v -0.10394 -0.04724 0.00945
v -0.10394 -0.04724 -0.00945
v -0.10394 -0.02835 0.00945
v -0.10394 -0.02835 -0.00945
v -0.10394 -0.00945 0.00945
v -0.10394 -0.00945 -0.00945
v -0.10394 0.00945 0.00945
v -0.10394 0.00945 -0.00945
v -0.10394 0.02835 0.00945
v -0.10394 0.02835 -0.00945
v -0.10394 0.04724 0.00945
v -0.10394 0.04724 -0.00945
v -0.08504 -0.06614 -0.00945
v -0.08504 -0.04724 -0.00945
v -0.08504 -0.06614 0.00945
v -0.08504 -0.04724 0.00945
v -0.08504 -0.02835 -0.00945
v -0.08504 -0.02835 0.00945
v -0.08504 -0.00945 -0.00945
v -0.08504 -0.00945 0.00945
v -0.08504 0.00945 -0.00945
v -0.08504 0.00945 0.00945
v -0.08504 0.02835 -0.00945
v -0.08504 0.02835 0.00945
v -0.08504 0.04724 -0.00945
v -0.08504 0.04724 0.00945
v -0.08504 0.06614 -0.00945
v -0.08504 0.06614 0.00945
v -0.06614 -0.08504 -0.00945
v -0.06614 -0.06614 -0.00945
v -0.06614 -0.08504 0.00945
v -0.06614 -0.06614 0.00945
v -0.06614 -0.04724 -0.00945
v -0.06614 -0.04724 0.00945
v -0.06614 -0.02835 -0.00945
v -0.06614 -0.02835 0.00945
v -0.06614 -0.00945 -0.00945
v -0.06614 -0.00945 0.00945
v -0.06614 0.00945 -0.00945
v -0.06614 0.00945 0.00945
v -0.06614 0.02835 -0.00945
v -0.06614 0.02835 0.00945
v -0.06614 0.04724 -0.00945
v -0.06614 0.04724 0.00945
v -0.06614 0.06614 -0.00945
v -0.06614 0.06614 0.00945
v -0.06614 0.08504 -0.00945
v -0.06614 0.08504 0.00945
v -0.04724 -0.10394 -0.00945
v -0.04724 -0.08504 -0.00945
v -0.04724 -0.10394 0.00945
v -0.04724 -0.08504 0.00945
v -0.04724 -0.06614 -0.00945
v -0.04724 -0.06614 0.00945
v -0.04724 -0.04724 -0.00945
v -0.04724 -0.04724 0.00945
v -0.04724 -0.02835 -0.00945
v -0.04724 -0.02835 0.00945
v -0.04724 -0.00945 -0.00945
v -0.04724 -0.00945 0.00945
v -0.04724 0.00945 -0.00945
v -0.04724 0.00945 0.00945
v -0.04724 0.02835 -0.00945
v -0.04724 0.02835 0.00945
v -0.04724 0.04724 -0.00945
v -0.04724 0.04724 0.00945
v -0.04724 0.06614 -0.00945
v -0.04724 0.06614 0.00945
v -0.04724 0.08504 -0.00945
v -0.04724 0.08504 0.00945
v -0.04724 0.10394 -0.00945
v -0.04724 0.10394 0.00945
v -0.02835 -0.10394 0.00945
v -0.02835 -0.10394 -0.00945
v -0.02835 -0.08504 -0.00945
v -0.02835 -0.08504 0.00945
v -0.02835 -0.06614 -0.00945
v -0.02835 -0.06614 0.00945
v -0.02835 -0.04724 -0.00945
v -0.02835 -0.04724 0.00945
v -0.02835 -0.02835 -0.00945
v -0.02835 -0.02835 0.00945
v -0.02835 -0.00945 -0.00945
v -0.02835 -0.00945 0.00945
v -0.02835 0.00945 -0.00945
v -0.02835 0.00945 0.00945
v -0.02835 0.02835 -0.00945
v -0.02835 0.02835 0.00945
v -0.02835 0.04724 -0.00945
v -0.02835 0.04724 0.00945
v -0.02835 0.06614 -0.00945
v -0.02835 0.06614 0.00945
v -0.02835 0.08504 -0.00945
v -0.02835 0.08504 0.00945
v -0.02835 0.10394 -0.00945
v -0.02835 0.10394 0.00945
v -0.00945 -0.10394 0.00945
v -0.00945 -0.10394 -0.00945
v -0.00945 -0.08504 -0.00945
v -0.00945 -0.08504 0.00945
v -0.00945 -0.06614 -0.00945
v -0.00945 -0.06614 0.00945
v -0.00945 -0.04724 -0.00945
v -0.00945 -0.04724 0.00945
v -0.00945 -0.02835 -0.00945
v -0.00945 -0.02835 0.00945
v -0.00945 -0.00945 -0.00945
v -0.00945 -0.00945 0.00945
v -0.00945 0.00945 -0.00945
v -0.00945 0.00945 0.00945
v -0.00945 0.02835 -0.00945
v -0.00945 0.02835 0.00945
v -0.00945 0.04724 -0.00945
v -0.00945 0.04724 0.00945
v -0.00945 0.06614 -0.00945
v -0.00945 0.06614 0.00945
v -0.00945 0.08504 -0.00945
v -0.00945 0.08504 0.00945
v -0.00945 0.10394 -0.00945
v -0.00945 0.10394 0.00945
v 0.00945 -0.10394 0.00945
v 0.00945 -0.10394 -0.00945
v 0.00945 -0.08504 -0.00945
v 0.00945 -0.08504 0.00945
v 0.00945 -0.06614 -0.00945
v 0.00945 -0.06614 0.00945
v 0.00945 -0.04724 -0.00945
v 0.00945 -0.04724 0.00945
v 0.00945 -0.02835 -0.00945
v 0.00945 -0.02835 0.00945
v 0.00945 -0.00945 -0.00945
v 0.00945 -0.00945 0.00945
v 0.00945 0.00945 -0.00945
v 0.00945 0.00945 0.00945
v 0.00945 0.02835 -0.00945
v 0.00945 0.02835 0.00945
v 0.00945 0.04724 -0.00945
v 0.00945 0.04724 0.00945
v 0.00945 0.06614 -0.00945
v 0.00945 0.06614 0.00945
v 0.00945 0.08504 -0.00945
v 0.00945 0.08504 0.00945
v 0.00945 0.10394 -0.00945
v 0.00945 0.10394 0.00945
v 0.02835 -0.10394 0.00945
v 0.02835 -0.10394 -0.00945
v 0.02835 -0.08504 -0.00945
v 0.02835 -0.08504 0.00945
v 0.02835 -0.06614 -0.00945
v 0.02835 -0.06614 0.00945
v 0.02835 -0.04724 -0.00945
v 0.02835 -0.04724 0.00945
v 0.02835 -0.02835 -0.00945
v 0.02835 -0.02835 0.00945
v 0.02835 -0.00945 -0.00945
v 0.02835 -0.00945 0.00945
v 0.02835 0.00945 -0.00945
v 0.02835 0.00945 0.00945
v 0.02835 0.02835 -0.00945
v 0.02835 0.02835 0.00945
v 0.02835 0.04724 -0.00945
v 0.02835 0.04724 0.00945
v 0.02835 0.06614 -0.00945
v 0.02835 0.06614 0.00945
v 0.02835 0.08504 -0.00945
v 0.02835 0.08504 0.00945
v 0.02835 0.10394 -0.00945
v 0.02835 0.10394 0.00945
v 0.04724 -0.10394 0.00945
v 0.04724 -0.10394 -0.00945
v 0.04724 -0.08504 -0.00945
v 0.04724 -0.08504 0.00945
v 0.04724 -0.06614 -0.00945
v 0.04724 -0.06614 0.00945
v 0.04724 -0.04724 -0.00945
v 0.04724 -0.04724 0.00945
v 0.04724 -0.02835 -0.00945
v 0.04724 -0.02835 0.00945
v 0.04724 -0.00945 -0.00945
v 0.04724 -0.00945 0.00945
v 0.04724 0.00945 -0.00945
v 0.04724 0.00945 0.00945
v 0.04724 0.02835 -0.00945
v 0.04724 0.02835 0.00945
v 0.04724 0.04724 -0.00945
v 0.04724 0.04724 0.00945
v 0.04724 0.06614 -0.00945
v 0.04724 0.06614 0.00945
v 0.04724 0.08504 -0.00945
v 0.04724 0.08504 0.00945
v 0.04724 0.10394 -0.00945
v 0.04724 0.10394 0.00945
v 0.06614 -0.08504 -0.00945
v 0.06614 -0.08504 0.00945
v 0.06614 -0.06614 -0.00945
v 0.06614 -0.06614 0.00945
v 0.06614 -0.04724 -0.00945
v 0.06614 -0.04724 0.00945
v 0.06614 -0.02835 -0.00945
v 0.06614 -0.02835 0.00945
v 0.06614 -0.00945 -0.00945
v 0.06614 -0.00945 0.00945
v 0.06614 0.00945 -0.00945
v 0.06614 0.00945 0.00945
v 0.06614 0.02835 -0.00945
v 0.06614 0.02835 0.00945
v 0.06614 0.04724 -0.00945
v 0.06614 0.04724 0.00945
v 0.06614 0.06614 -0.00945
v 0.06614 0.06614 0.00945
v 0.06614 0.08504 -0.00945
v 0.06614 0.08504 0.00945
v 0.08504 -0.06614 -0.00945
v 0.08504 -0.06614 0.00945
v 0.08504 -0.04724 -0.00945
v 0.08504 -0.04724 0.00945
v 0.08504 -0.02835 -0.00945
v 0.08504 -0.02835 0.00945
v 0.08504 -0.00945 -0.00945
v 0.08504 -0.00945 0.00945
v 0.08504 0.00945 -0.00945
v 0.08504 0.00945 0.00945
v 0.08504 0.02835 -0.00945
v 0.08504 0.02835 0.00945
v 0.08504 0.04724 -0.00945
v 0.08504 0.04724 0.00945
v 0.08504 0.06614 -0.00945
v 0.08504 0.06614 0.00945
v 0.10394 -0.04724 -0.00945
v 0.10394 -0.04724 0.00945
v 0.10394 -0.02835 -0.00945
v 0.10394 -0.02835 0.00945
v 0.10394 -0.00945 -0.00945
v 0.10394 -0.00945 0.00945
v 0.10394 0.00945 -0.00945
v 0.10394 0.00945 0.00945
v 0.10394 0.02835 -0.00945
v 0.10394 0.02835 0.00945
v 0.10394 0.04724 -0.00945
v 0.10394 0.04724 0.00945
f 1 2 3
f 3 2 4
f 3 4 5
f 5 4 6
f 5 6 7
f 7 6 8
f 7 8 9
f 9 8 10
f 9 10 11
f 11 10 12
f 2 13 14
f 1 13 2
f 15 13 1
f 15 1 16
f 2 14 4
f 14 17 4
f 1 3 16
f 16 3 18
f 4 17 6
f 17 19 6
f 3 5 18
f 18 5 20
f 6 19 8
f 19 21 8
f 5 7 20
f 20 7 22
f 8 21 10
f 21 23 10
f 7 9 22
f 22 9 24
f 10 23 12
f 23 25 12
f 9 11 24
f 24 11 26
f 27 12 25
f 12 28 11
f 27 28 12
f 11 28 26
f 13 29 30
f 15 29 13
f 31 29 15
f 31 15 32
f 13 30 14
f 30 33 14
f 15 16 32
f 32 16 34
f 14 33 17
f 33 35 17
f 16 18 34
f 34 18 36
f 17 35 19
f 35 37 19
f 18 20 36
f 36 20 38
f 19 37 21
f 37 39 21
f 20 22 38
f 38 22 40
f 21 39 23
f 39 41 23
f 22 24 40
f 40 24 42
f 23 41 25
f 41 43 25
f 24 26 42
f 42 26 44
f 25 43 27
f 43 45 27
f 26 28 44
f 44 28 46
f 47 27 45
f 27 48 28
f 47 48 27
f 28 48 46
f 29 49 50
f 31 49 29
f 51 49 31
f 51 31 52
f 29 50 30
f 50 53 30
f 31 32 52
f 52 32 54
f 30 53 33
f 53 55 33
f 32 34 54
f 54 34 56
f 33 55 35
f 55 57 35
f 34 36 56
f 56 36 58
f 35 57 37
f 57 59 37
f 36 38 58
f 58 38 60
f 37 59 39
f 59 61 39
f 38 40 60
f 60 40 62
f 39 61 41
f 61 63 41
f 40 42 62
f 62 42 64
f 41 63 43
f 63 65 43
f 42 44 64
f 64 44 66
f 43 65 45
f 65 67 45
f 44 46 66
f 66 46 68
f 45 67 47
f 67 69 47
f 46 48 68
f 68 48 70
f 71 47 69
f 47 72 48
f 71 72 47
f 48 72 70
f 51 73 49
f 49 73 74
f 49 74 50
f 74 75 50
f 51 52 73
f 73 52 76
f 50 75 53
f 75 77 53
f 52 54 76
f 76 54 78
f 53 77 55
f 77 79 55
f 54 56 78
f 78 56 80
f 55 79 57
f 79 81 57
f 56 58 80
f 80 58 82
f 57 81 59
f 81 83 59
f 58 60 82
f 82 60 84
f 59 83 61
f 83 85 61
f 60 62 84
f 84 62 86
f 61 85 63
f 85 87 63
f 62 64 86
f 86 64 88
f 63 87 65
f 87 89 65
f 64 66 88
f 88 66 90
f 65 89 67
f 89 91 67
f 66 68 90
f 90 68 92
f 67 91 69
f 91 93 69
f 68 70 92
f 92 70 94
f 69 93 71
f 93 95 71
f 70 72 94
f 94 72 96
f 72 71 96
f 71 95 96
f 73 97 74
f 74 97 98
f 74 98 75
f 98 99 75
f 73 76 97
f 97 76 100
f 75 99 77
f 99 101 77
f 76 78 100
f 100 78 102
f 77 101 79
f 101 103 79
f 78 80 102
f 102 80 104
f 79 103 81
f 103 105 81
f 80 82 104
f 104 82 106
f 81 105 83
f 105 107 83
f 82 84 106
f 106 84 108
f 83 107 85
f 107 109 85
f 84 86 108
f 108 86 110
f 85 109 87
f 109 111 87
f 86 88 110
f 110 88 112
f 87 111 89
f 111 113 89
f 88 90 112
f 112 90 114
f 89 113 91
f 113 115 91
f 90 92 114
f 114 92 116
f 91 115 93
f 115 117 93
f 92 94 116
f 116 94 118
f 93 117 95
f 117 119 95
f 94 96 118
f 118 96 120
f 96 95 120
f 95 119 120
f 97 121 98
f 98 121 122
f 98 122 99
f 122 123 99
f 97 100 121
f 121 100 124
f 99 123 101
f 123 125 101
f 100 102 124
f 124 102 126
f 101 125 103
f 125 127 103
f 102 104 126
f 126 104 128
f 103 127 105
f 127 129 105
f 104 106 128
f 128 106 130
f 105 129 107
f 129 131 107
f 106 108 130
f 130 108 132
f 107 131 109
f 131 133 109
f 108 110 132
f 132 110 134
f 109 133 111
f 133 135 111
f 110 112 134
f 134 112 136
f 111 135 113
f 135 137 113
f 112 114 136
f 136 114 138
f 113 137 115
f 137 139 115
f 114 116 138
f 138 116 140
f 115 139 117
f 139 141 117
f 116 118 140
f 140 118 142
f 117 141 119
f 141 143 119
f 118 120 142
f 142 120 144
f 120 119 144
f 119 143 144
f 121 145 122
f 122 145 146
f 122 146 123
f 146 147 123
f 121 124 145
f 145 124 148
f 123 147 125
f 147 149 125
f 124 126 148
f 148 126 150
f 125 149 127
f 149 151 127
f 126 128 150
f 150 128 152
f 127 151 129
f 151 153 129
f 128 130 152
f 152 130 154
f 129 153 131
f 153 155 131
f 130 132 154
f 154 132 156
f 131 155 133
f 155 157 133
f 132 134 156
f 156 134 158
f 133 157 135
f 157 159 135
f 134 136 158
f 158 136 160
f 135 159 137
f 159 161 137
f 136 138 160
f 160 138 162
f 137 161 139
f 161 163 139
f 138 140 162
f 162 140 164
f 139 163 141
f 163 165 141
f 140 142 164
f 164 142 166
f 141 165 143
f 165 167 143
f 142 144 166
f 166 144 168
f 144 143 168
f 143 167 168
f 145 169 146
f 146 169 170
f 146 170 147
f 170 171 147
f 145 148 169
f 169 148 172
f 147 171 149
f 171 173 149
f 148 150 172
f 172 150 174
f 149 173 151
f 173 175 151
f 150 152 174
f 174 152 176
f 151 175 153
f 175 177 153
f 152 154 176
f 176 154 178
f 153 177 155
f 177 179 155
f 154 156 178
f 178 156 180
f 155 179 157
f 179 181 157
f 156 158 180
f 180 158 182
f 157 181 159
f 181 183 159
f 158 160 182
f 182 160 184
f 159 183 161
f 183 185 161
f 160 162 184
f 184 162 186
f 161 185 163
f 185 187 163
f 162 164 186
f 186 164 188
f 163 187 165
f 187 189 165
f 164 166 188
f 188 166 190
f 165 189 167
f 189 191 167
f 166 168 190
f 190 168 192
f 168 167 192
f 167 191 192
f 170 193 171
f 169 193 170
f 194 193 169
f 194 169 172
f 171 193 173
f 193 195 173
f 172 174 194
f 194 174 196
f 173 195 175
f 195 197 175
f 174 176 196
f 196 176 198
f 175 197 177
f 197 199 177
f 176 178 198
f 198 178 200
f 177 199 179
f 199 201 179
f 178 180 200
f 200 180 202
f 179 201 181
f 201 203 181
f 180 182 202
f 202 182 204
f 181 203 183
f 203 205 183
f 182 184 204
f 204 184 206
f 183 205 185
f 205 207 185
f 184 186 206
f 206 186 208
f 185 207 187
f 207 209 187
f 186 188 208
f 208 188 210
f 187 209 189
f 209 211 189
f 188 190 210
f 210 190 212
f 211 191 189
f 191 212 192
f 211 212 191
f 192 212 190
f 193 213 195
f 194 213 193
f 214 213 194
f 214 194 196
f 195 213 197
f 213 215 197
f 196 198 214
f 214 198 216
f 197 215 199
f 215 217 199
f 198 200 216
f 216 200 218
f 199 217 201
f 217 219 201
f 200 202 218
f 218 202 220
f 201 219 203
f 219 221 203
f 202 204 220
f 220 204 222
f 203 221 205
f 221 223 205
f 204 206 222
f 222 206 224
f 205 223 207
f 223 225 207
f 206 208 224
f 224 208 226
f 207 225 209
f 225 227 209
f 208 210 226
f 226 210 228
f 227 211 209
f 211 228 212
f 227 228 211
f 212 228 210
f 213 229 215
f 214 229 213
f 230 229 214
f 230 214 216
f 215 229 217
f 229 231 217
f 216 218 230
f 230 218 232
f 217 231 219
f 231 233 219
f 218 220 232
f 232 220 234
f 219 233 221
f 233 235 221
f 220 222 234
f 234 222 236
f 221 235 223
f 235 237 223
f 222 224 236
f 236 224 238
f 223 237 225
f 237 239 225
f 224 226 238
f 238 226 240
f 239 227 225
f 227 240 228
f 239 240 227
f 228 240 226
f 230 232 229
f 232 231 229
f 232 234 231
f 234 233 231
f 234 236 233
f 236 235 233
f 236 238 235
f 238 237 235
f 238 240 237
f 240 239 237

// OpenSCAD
polyhedron(points=[
[-0.10393700787401561,-0.04724409448818889,-0.009448818897637823],
[-0.10393700787401561,-0.04724409448818889,-0.009448818897637823],
[-0.10393700787401561,-0.04724409448818889,-0.009448818897637823],
[-0.10393700787401561,-0.04724409448818889,0.009448818897637823],
[-0.10393700787401561,-0.04724409448818889,0.009448818897637823],
[-0.10393700787401561,-0.04724409448818889,0.009448818897637823],
[-0.10393700787401561,-0.02834645669291347,-0.009448818897637823],
[-0.10393700787401561,-0.02834645669291347,-0.009448818897637823],
[-0.10393700787401561,-0.02834645669291347,0.009448818897637823],
[-0.10393700787401561,-0.02834645669291347,0.009448818897637823],
[-0.10393700787401561,-0.009448818897637823,-0.009448818897637823],
[-0.10393700787401561,-0.009448818897637823,-0.009448818897637823],
[-0.10393700787401561,-0.009448818897637823,0.009448818897637823],
[-0.10393700787401561,-0.009448818897637823,0.009448818897637823],
[-0.10393700787401561,0.009448818897637823,-0.009448818897637823],
[-0.10393700787401561,0.009448818897637823,-0.009448818897637823],
[-0.10393700787401561,0.009448818897637823,0.009448818897637823],
[-0.10393700787401561,0.009448818897637823,0.009448818897637823],
[-0.10393700787401561,0.02834645669291347,-0.009448818897637823],
[-0.10393700787401561,0.02834645669291347,-0.009448818897637823],
[-0.10393700787401561,0.02834645669291347,0.009448818897637823],
[-0.10393700787401561,0.02834645669291347,0.009448818897637823],
[-0.10393700787401561,0.047244094488189115,-0.009448818897637823],
[-0.10393700787401561,0.047244094488189115,-0.009448818897637823],
[-0.10393700787401561,0.047244094488189115,0.009448818897637823],
[-0.10393700787401561,0.047244094488189115,0.009448818897637823],
[-0.10393700787401561,0.047244094488189115,-0.009448818897637823],
[-0.10393700787401561,0.047244094488189115,0.009448818897637823],
[-0.08503937007874018,-0.06614173228346454,-0.009448818897637823],
[-0.08503937007874018,-0.06614173228346454,-0.009448818897637823],
[-0.08503937007874018,-0.06614173228346454,-0.009448818897637823],
[-0.08503937007874018,-0.06614173228346454,0.009448818897637823],
[-0.08503937007874018,-0.06614173228346454,0.009448818897637823],
[-0.08503937007874018,-0.06614173228346454,0.009448818897637823],
[-0.08503937007874018,-0.04724409448818889,-0.009448818897637823],
[-0.08503937007874018,-0.04724409448818889,0.009448818897637823],
[-0.08503937007874018,-0.02834645669291347,-0.009448818897637823],
[-0.08503937007874018,-0.02834645669291347,0.009448818897637823],
[-0.08503937007874018,-0.009448818897637823,-0.009448818897637823],
[-0.08503937007874018,-0.009448818897637823,0.009448818897637823],
[-0.08503937007874018,0.009448818897637823,-0.009448818897637823],
[-0.08503937007874018,0.009448818897637823,0.009448818897637823],
[-0.08503937007874018,0.02834645669291347,-0.009448818897637823],
[-0.08503937007874018,0.02834645669291347,0.009448818897637823],
[-0.08503937007874018,0.047244094488189115,-0.009448818897637823],
[-0.08503937007874018,0.047244094488189115,0.009448818897637823],
[-0.08503937007874018,0.06614173228346454,-0.009448818897637823],
[-0.08503937007874018,0.06614173228346454,-0.009448818897637823],
[-0.08503937007874018,0.06614173228346454,0.009448818897637823],
[-0.08503937007874018,0.06614173228346454,0.009448818897637823],
[-0.08503937007874018,0.06614173228346454,-0.009448818897637823],
[-0.08503937007874018,0.06614173228346454,0.009448818897637823],
[-0.06614173228346454,-0.08503937007874018,-0.009448818897637823],
[-0.06614173228346454,-0.08503937007874018,-0.009448818897637823],
[-0.06614173228346454,-0.08503937007874018,-0.009448818897637823],
[-0.06614173228346454,-0.08503937007874018,0.009448818897637823],
[-0.06614173228346454,-0.08503937007874018,0.009448818897637823],
[-0.06614173228346454,-0.08503937007874018,0.009448818897637823],
[-0.06614173228346454,-0.06614173228346454,-0.009448818897637823],
[-0.06614173228346454,-0.06614173228346454,0.009448818897637823],
[-0.06614173228346454,-0.04724409448818889,-0.009448818897637823],
[-0.06614173228346454,-0.04724409448818889,0.009448818897637823],
[-0.06614173228346454,-0.02834645669291347,-0.009448818897637823],
[-0.06614173228346454,-0.02834645669291347,0.009448818897637823],
[-0.06614173228346454,-0.009448818897637823,-0.009448818897637823],
[-0.06614173228346454,-0.009448818897637823,0.009448818897637823],
[-0.06614173228346454,0.009448818897637823,-0.009448818897637823],
[-0.06614173228346454,0.009448818897637823,0.009448818897637823],
[-0.06614173228346454,0.02834645669291347,-0.009448818897637823],
[-0.06614173228346454,0.02834645669291347,0.009448818897637823],
[-0.06614173228346454,0.047244094488189115,-0.009448818897637823],
[-0.06614173228346454,0.047244094488189115,0.009448818897637823],
[-0.06614173228346454,0.06614173228346454,-0.009448818897637823],
[-0.06614173228346454,0.06614173228346454,0.009448818897637823],
[-0.06614173228346454,0.08503937007874018,-0.009448818897637823],
[-0.06614173228346454,0.08503937007874018,-0.009448818897637823],
[-0.06614173228346454,0.08503937007874018,0.009448818897637823],
[-0.06614173228346454,0.08503937007874018,0.009448818897637823],
[-0.06614173228346454,0.08503937007874018,-0.009448818897637823],
[-0.06614173228346454,0.08503937007874018,0.009448818897637823],
[-0.04724409448818889,-0.10393700787401561,-0.009448818897637823],
[-0.04724409448818889,-0.10393700787401561,-0.009448818897637823],
[-0.04724409448818889,-0.10393700787401561,-0.009448818897637823],
[-0.04724409448818889,-0.10393700787401561,0.009448818897637823],
[-0.04724409448818889,-0.10393700787401561,0.009448818897637823],
[-0.04724409448818889,-0.10393700787401561,0.009448818897637823],
[-0.04724409448818889,-0.08503937007874018,-0.009448818897637823],
[-0.04724409448818889,-0.08503937007874018,0.009448818897637823],
[-0.04724409448818889,-0.06614173228346454,-0.009448818897637823],
[-0.04724409448818889,-0.06614173228346454,0.009448818897637823],
[-0.04724409448818889,-0.04724409448818889,-0.009448818897637823],
[-0.04724409448818889,-0.04724409448818889,0.009448818897637823],
[-0.04724409448818889,-0.02834645669291347,-0.009448818897637823],
[-0.04724409448818889,-0.02834645669291347,0.009448818897637823],
[-0.04724409448818889,-0.009448818897637823,-0.009448818897637823],
[-0.04724409448818889,-0.009448818897637823,0.009448818897637823],
[-0.04724409448818889,0.009448818897637823,-0.009448818897637823],
[-0.04724409448818889,0.009448818897637823,0.009448818897637823],
[-0.04724409448818889,0.02834645669291347,-0.009448818897637823],
[-0.04724409448818889,0.02834645669291347,0.009448818897637823],
[-0.04724409448818889,0.047244094488189115,-0.009448818897637823],
[-0.04724409448818889,0.047244094488189115,0.009448818897637823],
[-0.04724409448818889,0.06614173228346454,-0.009448818897637823],
[-0.04724409448818889,0.06614173228346454,0.009448818897637823],
[-0.04724409448818889,0.08503937007874018,-0.009448818897637823],
[-0.04724409448818889,0.08503937007874018,0.009448818897637823],
[-0.04724409448818889,0.10393700787401583,-0.009448818897637823],
[-0.04724409448818889,0.10393700787401583,-0.009448818897637823],
[-0.04724409448818889,0.10393700787401583,0.009448818897637823],
[-0.04724409448818889,0.10393700787401583,0.009448818897637823],
[-0.04724409448818889,0.10393700787401583,-0.009448818897637823],
[-0.04724409448818889,0.10393700787401583,0.009448818897637823],
[-0.02834645669291347,-0.10393700787401561,-0.009448818897637823],
[-0.02834645669291347,-0.10393700787401561,-0.009448818897637823],
[-0.02834645669291347,-0.10393700787401561,0.009448818897637823],
[-0.02834645669291347,-0.10393700787401561,0.009448818897637823],
[-0.02834645669291347,-0.08503937007874018,-0.009448818897637823],
[-0.02834645669291347,-0.08503937007874018,0.009448818897637823],
[-0.02834645669291347,-0.06614173228346454,-0.009448818897637823],
[-0.02834645669291347,-0.06614173228346454,0.009448818897637823],
[-0.02834645669291347,-0.04724409448818889,-0.009448818897637823],
[-0.02834645669291347,-0.04724409448818889,0.009448818897637823],
[-0.02834645669291347,-0.02834645669291347,-0.009448818897637823],
[-0.02834645669291347,-0.02834645669291347,0.009448818897637823],
[-0.02834645669291347,-0.009448818897637823,-0.009448818897637823],
[-0.02834645669291347,-0.009448818897637823,0.009448818897637823],
[-0.02834645669291347,0.009448818897637823,-0.009448818897637823],
[-0.02834645669291347,0.009448818897637823,0.009448818897637823],
[-0.02834645669291347,0.02834645669291347,-0.009448818897637823],
[-0.02834645669291347,0.02834645669291347,0.009448818897637823],
[-0.02834645669291347,0.047244094488189115,-0.009448818897637823],
[-0.02834645669291347,0.047244094488189115,0.009448818897637823],
[-0.02834645669291347,0.06614173228346454,-0.009448818897637823],
[-0.02834645669291347,0.06614173228346454,0.009448818897637823],
[-0.02834645669291347,0.08503937007874018,-0.009448818897637823],
[-0.02834645669291347,0.08503937007874018,0.009448818897637823],
[-0.02834645669291347,0.10393700787401583,-0.009448818897637823],
[-0.02834645669291347,0.10393700787401583,0.009448818897637823],
[-0.02834645669291347,0.10393700787401583,-0.009448818897637823],
[-0.02834645669291347,0.10393700787401583,0.009448818897637823],
[-0.009448818897637823,-0.10393700787401561,-0.009448818897637823],
[-0.009448818897637823,-0.10393700787401561,-0.009448818897637823],
[-0.009448818897637823,-0.10393700787401561,0.009448818897637823],
[-0.009448818897637823,-0.10393700787401561,0.009448818897637823],
[-0.009448818897637823,-0.08503937007874018,-0.009448818897637823],
[-0.009448818897637823,-0.08503937007874018,0.009448818897637823],
[-0.009448818897637823,-0.06614173228346454,-0.009448818897637823],
[-0.009448818897637823,-0.06614173228346454,0.009448818897637823],
[-0.009448818897637823,-0.04724409448818889,-0.009448818897637823],
[-0.009448818897637823,-0.04724409448818889,0.009448818897637823],
[-0.009448818897637823,-0.02834645669291347,-0.009448818897637823],
[-0.009448818897637823,-0.02834645669291347,0.009448818897637823],
[-0.009448818897637823,-0.009448818897637823,-0.009448818897637823],
[-0.009448818897637823,-0.009448818897637823,0.009448818897637823],
[-0.009448818897637823,0.009448818897637823,-0.009448818897637823],
[-0.009448818897637823,0.009448818897637823,0.009448818897637823],
[-0.009448818897637823,0.02834645669291347,-0.009448818897637823],
[-0.009448818897637823,0.02834645669291347,0.009448818897637823],
[-0.009448818897637823,0.047244094488189115,-0.009448818897637823],
[-0.009448818897637823,0.047244094488189115,0.009448818897637823],
[-0.009448818897637823,0.06614173228346454,-0.009448818897637823],
[-0.009448818897637823,0.06614173228346454,0.009448818897637823],
[-0.009448818897637823,0.08503937007874018,-0.009448818897637823],
[-0.009448818897637823,0.08503937007874018,0.009448818897637823],
[-0.009448818897637823,0.10393700787401583,-0.009448818897637823],
[-0.009448818897637823,0.10393700787401583,0.009448818897637823],
[-0.009448818897637823,0.10393700787401583,-0.009448818897637823],
[-0.009448818897637823,0.10393700787401583,0.009448818897637823],
[0.009448818897637823,-0.10393700787401561,-0.009448818897637823],
[0.009448818897637823,-0.10393700787401561,-0.009448818897637823],
[0.009448818897637823,-0.10393700787401561,0.009448818897637823],
[0.009448818897637823,-0.10393700787401561,0.009448818897637823],
[0.009448818897637823,-0.08503937007874018,-0.009448818897637823],
[0.009448818897637823,-0.08503937007874018,0.009448818897637823],
[0.009448818897637823,-0.06614173228346454,-0.009448818897637823],
[0.009448818897637823,-0.06614173228346454,0.009448818897637823],
[0.009448818897637823,-0.04724409448818889,-0.009448818897637823],
[0.009448818897637823,-0.04724409448818889,0.009448818897637823],
[0.009448818897637823,-0.02834645669291347,-0.009448818897637823],
[0.009448818897637823,-0.02834645669291347,0.009448818897637823],
[0.009448818897637823,-0.009448818897637823,-0.009448818897637823],
[0.009448818897637823,-0.009448818897637823,0.009448818897637823],
[0.009448818897637823,0.009448818897637823,-0.009448818897637823],
[0.009448818897637823,0.009448818897637823,0.009448818897637823],
[0.009448818897637823,0.02834645669291347,-0.009448818897637823],
[0.009448818897637823,0.02834645669291347,0.009448818897637823],
[0.009448818897637823,0.047244094488189115,-0.009448818897637823],
[0.009448818897637823,0.047244094488189115,0.009448818897637823],
[0.009448818897637823,0.06614173228346454,-0.009448818897637823],
[0.009448818897637823,0.06614173228346454,0.009448818897637823],
[0.009448818897637823,0.08503937007874018,-0.009448818897637823],
[0.009448818897637823,0.08503937007874018,0.009448818897637823],
[0.009448818897637823,0.10393700787401583,-0.009448818897637823],
[0.009448818897637823,0.10393700787401583,0.009448818897637823],
[0.009448818897637823,0.10393700787401583,-0.009448818897637823],
[0.009448818897637823,0.10393700787401583,0.009448818897637823],
[0.02834645669291347,-0.10393700787401561,-0.009448818897637823],
[0.02834645669291347,-0.10393700787401561,-0.009448818897637823],
[0.02834645669291347,-0.10393700787401561,0.009448818897637823],
[0.02834645669291347,-0.10393700787401561,0.009448818897637823],
[0.02834645669291347,-0.08503937007874018,-0.009448818897637823],
[0.02834645669291347,-0.08503937007874018,0.009448818897637823],
[0.02834645669291347,-0.06614173228346454,-0.009448818897637823],
[0.02834645669291347,-0.06614173228346454,0.009448818897637823],
[0.02834645669291347,-0.04724409448818889,-0.009448818897637823],
[0.02834645669291347,-0.04724409448818889,0.009448818897637823],
[0.02834645669291347,-0.02834645669291347,-0.009448818897637823],
[0.02834645669291347,-0.02834645669291347,0.009448818897637823],
[0.02834645669291347,-0.009448818897637823,-0.009448818897637823],
[0.02834645669291347,-0.009448818897637823,0.009448818897637823],
[0.02834645669291347,0.009448818897637823,-0.009448818897637823],
[0.02834645669291347,0.009448818897637823,0.009448818897637823],
[0.02834645669291347,0.02834645669291347,-0.009448818897637823],
[0.02834645669291347,0.02834645669291347,0.009448818897637823],
[0.02834645669291347,0.047244094488189115,-0.009448818897637823],
[0.02834645669291347,0.047244094488189115,0.009448818897637823],
[0.02834645669291347,0.06614173228346454,-0.009448818897637823],
[0.02834645669291347,0.06614173228346454,0.009448818897637823],
[0.02834645669291347,0.08503937007874018,-0.009448818897637823],
[0.02834645669291347,0.08503937007874018,0.009448818897637823],
[0.02834645669291347,0.10393700787401583,-0.009448818897637823],
[0.02834645669291347,0.10393700787401583,0.009448818897637823],
[0.02834645669291347,0.10393700787401583,-0.009448818897637823],
[0.02834645669291347,0.10393700787401583,0.009448818897637823],
[0.047244094488189115,-0.10393700787401561,-0.009448818897637823],
[0.047244094488189115,-0.10393700787401561,-0.009448818897637823],
[0.047244094488189115,-0.10393700787401561,0.009448818897637823],
[0.047244094488189115,-0.10393700787401561,0.009448818897637823],
[0.047244094488189115,-0.08503937007874018,-0.009448818897637823],
[0.047244094488189115,-0.08503937007874018,0.009448818897637823],
[0.047244094488189115,-0.06614173228346454,-0.009448818897637823],
[0.047244094488189115,-0.06614173228346454,0.009448818897637823],
[0.047244094488189115,-0.04724409448818889,-0.009448818897637823],
[0.047244094488189115,-0.04724409448818889,0.009448818897637823],
[0.047244094488189115,-0.02834645669291347,-0.009448818897637823],
[0.047244094488189115,-0.02834645669291347,0.009448818897637823],
[0.047244094488189115,-0.009448818897637823,-0.009448818897637823],
[0.047244094488189115,-0.009448818897637823,0.009448818897637823],
[0.047244094488189115,0.009448818897637823,-0.009448818897637823],
[0.047244094488189115,0.009448818897637823,0.009448818897637823],
[0.047244094488189115,0.02834645669291347,-0.009448818897637823],
[0.047244094488189115,0.02834645669291347,0.009448818897637823],
[0.047244094488189115,0.047244094488189115,-0.009448818897637823],
[0.047244094488189115,0.047244094488189115,0.009448818897637823],
[0.047244094488189115,0.06614173228346454,-0.009448818897637823],
[0.047244094488189115,0.06614173228346454,0.009448818897637823],
[0.047244094488189115,0.08503937007874018,-0.009448818897637823],
[0.047244094488189115,0.08503937007874018,0.009448818897637823],
[0.047244094488189115,0.10393700787401583,-0.009448818897637823],
[0.047244094488189115,0.10393700787401583,0.009448818897637823],
[0.047244094488189115,0.10393700787401583,-0.009448818897637823],
[0.047244094488189115,0.10393700787401583,0.009448818897637823],
[0.047244094488189115,-0.10393700787401561,-0.009448818897637823],
[0.047244094488189115,-0.10393700787401561,0.009448818897637823],
[0.06614173228346454,-0.08503937007874018,-0.009448818897637823],
[0.06614173228346454,-0.08503937007874018,-0.009448818897637823],
[0.06614173228346454,-0.08503937007874018,0.009448818897637823],
[0.06614173228346454,-0.08503937007874018,0.009448818897637823],
[0.06614173228346454,-0.06614173228346454,-0.009448818897637823],
[0.06614173228346454,-0.06614173228346454,0.009448818897637823],
[0.06614173228346454,-0.04724409448818889,-0.009448818897637823],
[0.06614173228346454,-0.04724409448818889,0.009448818897637823],
[0.06614173228346454,-0.02834645669291347,-0.009448818897637823],
[0.06614173228346454,-0.02834645669291347,0.009448818897637823],
[0.06614173228346454,-0.009448818897637823,-0.009448818897637823],
[0.06614173228346454,-0.009448818897637823,0.009448818897637823],
[0.06614173228346454,0.009448818897637823,-0.009448818897637823],
[0.06614173228346454,0.009448818897637823,0.009448818897637823],
[0.06614173228346454,0.02834645669291347,-0.009448818897637823],
[0.06614173228346454,0.02834645669291347,0.009448818897637823],
[0.06614173228346454,0.047244094488189115,-0.009448818897637823],
[0.06614173228346454,0.047244094488189115,0.009448818897637823],
[0.06614173228346454,0.06614173228346454,-0.009448818897637823],
[0.06614173228346454,0.06614173228346454,0.009448818897637823],
[0.06614173228346454,0.08503937007874018,-0.009448818897637823],
[0.06614173228346454,0.08503937007874018,0.009448818897637823],
[0.06614173228346454,0.08503937007874018,-0.009448818897637823],
[0.047244094488189115,0.10393700787401583,-0.009448818897637823],
[0.06614173228346454,0.08503937007874018,0.009448818897637823],
[0.047244094488189115,0.10393700787401583,0.009448818897637823],
[0.06614173228346454,-0.08503937007874018,-0.009448818897637823],
[0.06614173228346454,-0.08503937007874018,0.009448818897637823],
[0.08503937007874018,-0.06614173228346454,-0.009448818897637823],
[0.08503937007874018,-0.06614173228346454,-0.009448818897637823],
[0.08503937007874018,-0.06614173228346454,0.009448818897637823],
[0.08503937007874018,-0.06614173228346454,0.009448818897637823],
[0.08503937007874018,-0.04724409448818889,-0.009448818897637823],
[0.08503937007874018,-0.04724409448818889,0.009448818897637823],
[0.08503937007874018,-0.02834645669291347,-0.009448818897637823],
[0.08503937007874018,-0.02834645669291347,0.009448818897637823],
[0.08503937007874018,-0.009448818897637823,-0.009448818897637823],
[0.08503937007874018,-0.009448818897637823,0.009448818897637823],
[0.08503937007874018,0.009448818897637823,-0.009448818897637823],
[0.08503937007874018,0.009448818897637823,0.009448818897637823],
[0.08503937007874018,0.02834645669291347,-0.009448818897637823],
[0.08503937007874018,0.02834645669291347,0.009448818897637823],
[0.08503937007874018,0.047244094488189115,-0.009448818897637823],
[0.08503937007874018,0.047244094488189115,0.009448818897637823],
[0.08503937007874018,0.06614173228346454,-0.009448818897637823],
[0.08503937007874018,0.06614173228346454,0.009448818897637823],
[0.08503937007874018,0.06614173228346454,-0.009448818897637823],
[0.06614173228346454,0.08503937007874018,-0.009448818897637823],
[0.08503937007874018,0.06614173228346454,0.009448818897637823],
[0.06614173228346454,0.08503937007874018,0.009448818897637823],
[0.08503937007874018,-0.06614173228346454,-0.009448818897637823],
[0.08503937007874018,-0.06614173228346454,0.009448818897637823],
[0.10393700787401583,-0.04724409448818889,-0.009448818897637823],
[0.10393700787401583,-0.04724409448818889,-0.009448818897637823],
[0.10393700787401583,-0.04724409448818889,0.009448818897637823],
[0.10393700787401583,-0.04724409448818889,0.009448818897637823],
[0.10393700787401583,-0.02834645669291347,-0.009448818897637823],
[0.10393700787401583,-0.02834645669291347,0.009448818897637823],
[0.10393700787401583,-0.009448818897637823,-0.009448818897637823],
[0.10393700787401583,-0.009448818897637823,0.009448818897637823],
[0.10393700787401583,0.009448818897637823,-0.009448818897637823],
[0.10393700787401583,0.009448818897637823,0.009448818897637823],
[0.10393700787401583,0.02834645669291347,-0.009448818897637823],
[0.10393700787401583,0.02834645669291347,0.009448818897637823],
[0.10393700787401583,0.047244094488189115,-0.009448818897637823],
[0.10393700787401583,0.047244094488189115,0.009448818897637823],
[0.10393700787401583,0.047244094488189115,-0.009448818897637823],
[0.08503937007874018,0.06614173228346454,-0.009448818897637823],
[0.10393700787401583,0.047244094488189115,0.009448818897637823],
[0.08503937007874018,0.06614173228346454,0.009448818897637823],
[0.10393700787401583,-0.04724409448818889,-0.009448818897637823],
[0.10393700787401583,-0.04724409448818889,0.009448818897637823],
[0.10393700787401583,-0.02834645669291347,-0.009448818897637823],
[0.10393700787401583,-0.02834645669291347,0.009448818897637823],
[0.10393700787401583,-0.009448818897637823,-0.009448818897637823],
[0.10393700787401583,-0.009448818897637823,0.009448818897637823],
[0.10393700787401583,0.009448818897637823,-0.009448818897637823],
[0.10393700787401583,0.009448818897637823,0.009448818897637823],
[0.10393700787401583,0.02834645669291347,-0.009448818897637823],
[0.10393700787401583,0.02834645669291347,0.009448818897637823],
[0.10393700787401583,0.047244094488189115,-0.009448818897637823],
[0.10393700787401583,0.047244094488189115,0.009448818897637823],
], faces=[
[2,1,0],
[4,3,0],
[4,0,1],
[5,3,4],
[2,0,6],
[2,6,7],
[8,0,3],
[6,0,8],
[3,5,9],
[3,9,8],
[7,6,10],
[7,10,11],
[12,6,8],
[10,6,12],
[8,9,13],
[8,13,12],
[11,10,14],
[11,14,15],
[16,10,12],
[14,10,16],
[12,13,17],
[12,17,16],
[15,14,18],
[15,18,19],
[20,14,16],
[18,14,20],
[16,17,21],
[16,21,20],
[19,18,22],
[19,22,23],
[24,18,20],
[22,18,24],
[20,21,25],
[20,25,24],
[26,23,22],
[26,22,24],
[26,24,27],
[27,24,25],
[30,29,28],
[32,31,28],
[32,28,29],
[33,31,32],
[30,28,1],
[2,30,1],
[34,30,2],
[1,28,4],
[4,28,31],
[5,4,31],
[33,5,31],
[35,5,33],
[7,34,2],
[7,36,34],
[35,9,5],
[37,9,35],
[11,36,7],
[11,38,36],
[37,13,9],
[39,13,37],
[15,38,11],
[15,40,38],
[39,17,13],
[41,17,39],
[19,40,15],
[19,42,40],
[41,21,17],
[43,21,41],
[23,42,19],
[23,44,42],
[43,25,21],
[45,25,43],
[23,26,46],
[47,23,46],
[44,23,47],
[27,48,26],
[26,48,46],
[49,48,27],
[25,49,27],
[45,49,25],
[50,47,46],
[50,46,48],
[50,48,51],
[51,48,49],
[54,53,52],
[56,55,52],
[56,52,53],
[57,55,56],
[54,52,29],
[30,54,29],
[58,54,30],
[29,52,32],
[32,52,55],
[33,32,55],
[57,33,55],
[59,33,57],
[34,58,30],
[34,60,58],
[59,35,33],
[61,35,59],
[36,60,34],
[36,62,60],
[61,37,35],
[63,37,61],
[38,62,36],
[38,64,62],
[63,39,37],
[65,39,63],
[40,64,38],
[40,66,64],
[65,41,39],
[67,41,65],
[42,66,40],
[42,68,66],
[67,43,41],
[69,43,67],
[44,68,42],
[44,70,68],
[69,45,43],
[71,45,69],
[47,70,44],
[47,72,70],
[71,49,45],
[73,49,71],
[47,50,74],
[75,47,74],
[72,47,75],
[51,76,50],
[50,76,74],
[77,76,51],
[49,77,51],
[73,77,49],
[78,75,74],
[78,74,76],
[78,76,79],
[79,76,77],
[82,81,80],
[84,83,80],
[84,80,81],
[85,83,84],
[82,80,53],
[54,82,53],
[86,82,54],
[53,80,56],
[56,80,83],
[57,56,83],
[85,57,83],
[87,57,85],
[58,86,54],
[58,88,86],
[87,59,57],
[89,59,87],
[60,88,58],
[60,90,88],
[89,61,59],
[91,61,89],
[62,90,60],
[62,92,90],
[91,63,61],
[93,63,91],
[64,92,62],
[64,94,92],
[93,65,63],
[95,65,93],
[66,94,64],
[66,96,94],
[95,67,65],
[97,67,95],
[68,96,66],
[68,98,96],
[97,69,67],
[99,69,97],
[70,98,68],
[70,100,98],
[99,71,69],
[101,71,99],
[72,100,70],
[72,102,100],
[101,73,71],
[103,73,101],
[75,102,72],
[75,104,102],
[103,77,73],
[105,77,103],
[75,78,106],
[107,75,106],
[104,75,107],
[79,108,78],
[78,108,106],
[109,108,79],
[77,109,79],
[105,109,77],
[110,107,106],
[110,106,108],
[110,108,111],
[111,108,109],
[113,112,81],
[113,81,82],
[81,114,84],
[112,114,81],
[85,84,114],
[85,114,115],
[86,113,82],
[86,116,113],
[115,87,85],
[117,87,115],
[88,116,86],
[88,118,116],
[117,89,87],
[119,89,117],
[90,118,88],
[90,120,118],
[119,91,89],
[121,91,119],
[92,120,90],
[92,122,120],
[121,93,91],
[123,93,121],
[94,122,92],
[94,124,122],
[123,95,93],
[125,95,123],
[96,124,94],
[96,126,124],
[125,97,95],
[127,97,125],
[98,126,96],
[98,128,126],
[127,99,97],
[129,99,127],
[100,128,98],
[100,130,128],
[129,101,99],
[131,101,129],
[102,130,100],
[102,132,130],
[131,103,101],
[133,103,131],
[104,132,102],
[104,134,132],
[133,105,103],
[135,105,133],
[107,134,104],
[107,136,134],
[135,109,105],
[137,109,135],
[138,136,107],
[138,107,110],
[139,110,111],
[139,138,110],
[111,109,137],
[111,137,139],
[141,140,112],
[141,112,113],
[112,142,114],
[140,142,112],
[115,114,142],
[115,142,143],
[116,141,113],
[116,144,141],
[143,117,115],
[145,117,143],
[118,144,116],
[118,146,144],
[145,119,117],
[147,119,145],
[120,146,118],
[120,148,146],
[147,121,119],
[149,121,147],
[122,148,120],
[122,150,148],
[149,123,121],
[151,123,149],
[124,150,122],
[124,152,150],
[151,125,123],
[153,125,151],
[126,152,124],
[126,154,152],
[153,127,125],
[155,127,153],
[128,154,126],
[128,156,154],
[155,129,127],
[157,129,155],
[130,156,128],
[130,158,156],
[157,131,129],
[159,131,157],
[132,158,130],
[132,160,158],
[159,133,131],
[161,133,159],
[134,160,132],
[134,162,160],
[161,135,133],
[163,135,161],
[136,162,134],
[136,164,162],
[163,137,135],
[165,137,163],
[166,164,136],
[166,136,138],
[167,138,139],
[167,166,138],
[139,137,165],
[139,165,167],
[169,168,140],
[169,140,141],
[140,170,142],
[168,170,140],
[143,142,170],
[143,170,171],
[144,169,141],
[144,172,169],
[171,145,143],
[173,145,171],
[146,172,144],
[146,174,172],
[173,147,145],
[175,147,173],
[148,174,146],
[148,176,174],
[175,149,147],
[177,149,175],
[150,176,148],
[150,178,176],
[177,151,149],
[179,151,177],
[152,178,150],
[152,180,178],
[179,153,151],
[181,153,179],
[154,180,152],
[154,182,180],
[181,155,153],
[183,155,181],
[156,182,154],
[156,184,182],
[183,157,155],
[185,157,183],
[158,184,156],
[158,186,184],
[185,159,157],
[187,159,185],
[160,186,158],
[160,188,186],
[187,161,159],
[189,161,187],
[162,188,160],
[162,190,188],
[189,163,161],
[191,163,189],
[164,190,162],
[164,192,190],
[191,165,163],
[193,165,191],
[194,192,164],
[194,164,166],
[195,166,167],
[195,194,166],
[167,165,193],
[167,193,195],
[197,196,168],
[197,168,169],
[168,198,170],
[196,198,168],
[171,170,198],
[171,198,199],
[172,197,169],
[172,200,197],
[199,173,171],
[201,173,199],
[174,200,172],
[174,202,200],
[201,175,173],
[203,175,201],
[176,202,174],
[176,204,202],
[203,177,175],
[205,177,203],
[178,204,176],
[178,206,204],
[205,179,177],
[207,179,205],
[180,206,178],
[180,208,206],
[207,181,179],
[209,181,207],
[182,208,180],
[182,210,208],
[209,183,181],
[211,183,209],
[184,210,182],
[184,212,210],
[211,185,183],
[213,185,211],
[186,212,184],
[186,214,212],
[213,187,185],
[215,187,213],
[188,214,186],
[188,216,214],
[215,189,187],
[217,189,215],
[190,216,188],
[190,218,216],
[217,191,189],
[219,191,217],
[192,218,190],
[192,220,218],
[219,193,191],
[221,193,219],
[222,220,192],
[222,192,194],
[223,194,195],
[223,222,194],
[195,193,221],
[195,221,223],
[225,224,196],
[225,196,197],
[196,226,198],
[224,226,196],
[199,198,226],
[199,226,227],
[200,225,197],
[200,228,225],
[227,201,199],
[229,201,227],
[202,228,200],
[202,230,228],
[229,203,201],
[231,203,229],
[204,230,202],
[204,232,230],
[231,205,203],
[233,205,231],
[206,232,204],
[206,234,232],
[233,207,205],
[235,207,233],
[208,234,206],
[208,236,234],
[235,209,207],
[237,209,235],
[210,236,208],
[210,238,236],
[237,211,209],
[239,211,237],
[212,238,210],
[212,240,238],
[239,213,211],
[241,213,239],
[214,240,212],
[214,242,240],
[241,215,213],
[243,215,241],
[216,242,214],
[216,244,242],
[243,217,215],
[245,217,243],
[218,244,216],
[218,246,244],
[245,219,217],
[247,219,245],
[220,246,218],
[220,248,246],
[247,221,219],
[249,221,247],
[250,248,220],
[250,220,222],
[251,222,223],
[251,250,222],
[223,221,249],
[223,249,251],
[225,252,224],
[253,226,224],
[253,224,252],
[253,227,226],
[255,254,252],
[225,255,252],
[228,255,225],
[252,254,253],
[253,254,256],
[227,253,256],
[257,227,256],
[229,227,257],
[230,255,228],
[230,258,255],
[257,231,229],
[259,231,257],
[232,258,230],
[232,260,258],
[259,233,231],
[261,233,259],
[234,260,232],
[234,262,260],
[261,235,233],
[263,235,261],
[236,262,234],
[236,264,262],
[263,237,235],
[265,237,263],
[238,264,236],
[238,266,264],
[265,239,237],
[267,239,265],
[240,266,238],
[240,268,266],
[267,241,239],
[269,241,267],
[242,268,240],
[242,270,268],
[269,243,241],
[271,243,269],
[244,270,242],
[244,272,270],
[271,245,243],
[273,245,271],
[246,272,244],
[246,274,272],
[273,247,245],
[275,247,273],
[248,277,276],
[274,248,276],
[246,248,274],
[279,278,277],
[277,278,276],
[275,278,279],
[249,275,279],
[247,275,249],
[250,277,248],
[277,250,251],
[277,251,279],
[279,251,249],
[255,280,254],
[281,256,254],
[281,254,280],
[281,257,256],
[283,282,280],
[255,283,280],
[258,283,255],
[280,282,281],
[281,282,284],
[257,281,284],
[285,257,284],
[259,257,285],
[260,283,258],
[260,286,283],
[285,261,259],
[287,261,285],
[262,286,260],
[262,288,286],
[287,263,261],
[289,263,287],
[264,288,262],
[264,290,288],
[289,265,263],
[291,265,289],
[266,290,264],
[266,292,290],
[291,267,265],
[293,267,291],
[268,292,266],
[268,294,292],
[293,269,267],
[295,269,293],
[270,294,268],
[270,296,294],
[295,271,269],
[297,271,295],
[272,296,270],
[272,298,296],
[297,273,271],
[299,273,297],
[274,301,300],
[298,274,300],
[272,274,298],
[303,302,301],
[301,302,300],
[299,302,303],
[275,299,303],
[273,299,275],
[276,301,274],
[301,276,278],
[301,278,303],
[303,278,275],
[283,304,282],
[305,284,282],
[305,282,304],
[305,285,284],
[307,306,304],
[283,307,304],
[286,307,283],
[304,306,305],
[305,306,308],
[285,305,308],
[309,285,308],
[287,285,309],
[288,307,286],
[288,310,307],
[309,289,287],
[311,289,309],
[290,310,288],
[290,312,310],
[311,291,289],
[313,291,311],
[292,312,290],
[292,314,312],
[313,293,291],
[315,293,313],
[294,314,292],
[294,316,314],
[315,295,293],
[317,295,315],
[296,316,294],
[296,318,316],
[317,297,295],
[319,297,317],
[298,321,320],
[318,298,320],
[296,298,318],
[323,322,321],
[321,322,320],
[319,322,323],
[299,319,323],
[297,319,299],
[300,321,298],
[321,300,302],
[321,302,323],
[323,302,299],
[307,324,306],
[325,308,306],
[325,306,324],
[325,309,308],
[310,326,324],
[310,324,307],
[324,327,325],
[324,326,327],
[327,311,309],
[327,309,325],
[312,328,326],
[312,326,310],
[326,329,327],
[326,328,329],
[329,313,311],
[329,311,327],
[314,330,328],
[314,328,312],
[328,331,329],
[328,330,331],
[331,315,313],
[331,313,329],
[316,332,330],
[316,330,314],
[330,333,331],
[330,332,333],
[333,317,315],
[333,315,331],
[318,334,332],
[318,332,316],
[332,335,333],
[332,334,335],
[335,319,317],
[335,317,333],
[320,334,318],
[334,320,322],
[334,322,335],
[335,322,319],
]);
